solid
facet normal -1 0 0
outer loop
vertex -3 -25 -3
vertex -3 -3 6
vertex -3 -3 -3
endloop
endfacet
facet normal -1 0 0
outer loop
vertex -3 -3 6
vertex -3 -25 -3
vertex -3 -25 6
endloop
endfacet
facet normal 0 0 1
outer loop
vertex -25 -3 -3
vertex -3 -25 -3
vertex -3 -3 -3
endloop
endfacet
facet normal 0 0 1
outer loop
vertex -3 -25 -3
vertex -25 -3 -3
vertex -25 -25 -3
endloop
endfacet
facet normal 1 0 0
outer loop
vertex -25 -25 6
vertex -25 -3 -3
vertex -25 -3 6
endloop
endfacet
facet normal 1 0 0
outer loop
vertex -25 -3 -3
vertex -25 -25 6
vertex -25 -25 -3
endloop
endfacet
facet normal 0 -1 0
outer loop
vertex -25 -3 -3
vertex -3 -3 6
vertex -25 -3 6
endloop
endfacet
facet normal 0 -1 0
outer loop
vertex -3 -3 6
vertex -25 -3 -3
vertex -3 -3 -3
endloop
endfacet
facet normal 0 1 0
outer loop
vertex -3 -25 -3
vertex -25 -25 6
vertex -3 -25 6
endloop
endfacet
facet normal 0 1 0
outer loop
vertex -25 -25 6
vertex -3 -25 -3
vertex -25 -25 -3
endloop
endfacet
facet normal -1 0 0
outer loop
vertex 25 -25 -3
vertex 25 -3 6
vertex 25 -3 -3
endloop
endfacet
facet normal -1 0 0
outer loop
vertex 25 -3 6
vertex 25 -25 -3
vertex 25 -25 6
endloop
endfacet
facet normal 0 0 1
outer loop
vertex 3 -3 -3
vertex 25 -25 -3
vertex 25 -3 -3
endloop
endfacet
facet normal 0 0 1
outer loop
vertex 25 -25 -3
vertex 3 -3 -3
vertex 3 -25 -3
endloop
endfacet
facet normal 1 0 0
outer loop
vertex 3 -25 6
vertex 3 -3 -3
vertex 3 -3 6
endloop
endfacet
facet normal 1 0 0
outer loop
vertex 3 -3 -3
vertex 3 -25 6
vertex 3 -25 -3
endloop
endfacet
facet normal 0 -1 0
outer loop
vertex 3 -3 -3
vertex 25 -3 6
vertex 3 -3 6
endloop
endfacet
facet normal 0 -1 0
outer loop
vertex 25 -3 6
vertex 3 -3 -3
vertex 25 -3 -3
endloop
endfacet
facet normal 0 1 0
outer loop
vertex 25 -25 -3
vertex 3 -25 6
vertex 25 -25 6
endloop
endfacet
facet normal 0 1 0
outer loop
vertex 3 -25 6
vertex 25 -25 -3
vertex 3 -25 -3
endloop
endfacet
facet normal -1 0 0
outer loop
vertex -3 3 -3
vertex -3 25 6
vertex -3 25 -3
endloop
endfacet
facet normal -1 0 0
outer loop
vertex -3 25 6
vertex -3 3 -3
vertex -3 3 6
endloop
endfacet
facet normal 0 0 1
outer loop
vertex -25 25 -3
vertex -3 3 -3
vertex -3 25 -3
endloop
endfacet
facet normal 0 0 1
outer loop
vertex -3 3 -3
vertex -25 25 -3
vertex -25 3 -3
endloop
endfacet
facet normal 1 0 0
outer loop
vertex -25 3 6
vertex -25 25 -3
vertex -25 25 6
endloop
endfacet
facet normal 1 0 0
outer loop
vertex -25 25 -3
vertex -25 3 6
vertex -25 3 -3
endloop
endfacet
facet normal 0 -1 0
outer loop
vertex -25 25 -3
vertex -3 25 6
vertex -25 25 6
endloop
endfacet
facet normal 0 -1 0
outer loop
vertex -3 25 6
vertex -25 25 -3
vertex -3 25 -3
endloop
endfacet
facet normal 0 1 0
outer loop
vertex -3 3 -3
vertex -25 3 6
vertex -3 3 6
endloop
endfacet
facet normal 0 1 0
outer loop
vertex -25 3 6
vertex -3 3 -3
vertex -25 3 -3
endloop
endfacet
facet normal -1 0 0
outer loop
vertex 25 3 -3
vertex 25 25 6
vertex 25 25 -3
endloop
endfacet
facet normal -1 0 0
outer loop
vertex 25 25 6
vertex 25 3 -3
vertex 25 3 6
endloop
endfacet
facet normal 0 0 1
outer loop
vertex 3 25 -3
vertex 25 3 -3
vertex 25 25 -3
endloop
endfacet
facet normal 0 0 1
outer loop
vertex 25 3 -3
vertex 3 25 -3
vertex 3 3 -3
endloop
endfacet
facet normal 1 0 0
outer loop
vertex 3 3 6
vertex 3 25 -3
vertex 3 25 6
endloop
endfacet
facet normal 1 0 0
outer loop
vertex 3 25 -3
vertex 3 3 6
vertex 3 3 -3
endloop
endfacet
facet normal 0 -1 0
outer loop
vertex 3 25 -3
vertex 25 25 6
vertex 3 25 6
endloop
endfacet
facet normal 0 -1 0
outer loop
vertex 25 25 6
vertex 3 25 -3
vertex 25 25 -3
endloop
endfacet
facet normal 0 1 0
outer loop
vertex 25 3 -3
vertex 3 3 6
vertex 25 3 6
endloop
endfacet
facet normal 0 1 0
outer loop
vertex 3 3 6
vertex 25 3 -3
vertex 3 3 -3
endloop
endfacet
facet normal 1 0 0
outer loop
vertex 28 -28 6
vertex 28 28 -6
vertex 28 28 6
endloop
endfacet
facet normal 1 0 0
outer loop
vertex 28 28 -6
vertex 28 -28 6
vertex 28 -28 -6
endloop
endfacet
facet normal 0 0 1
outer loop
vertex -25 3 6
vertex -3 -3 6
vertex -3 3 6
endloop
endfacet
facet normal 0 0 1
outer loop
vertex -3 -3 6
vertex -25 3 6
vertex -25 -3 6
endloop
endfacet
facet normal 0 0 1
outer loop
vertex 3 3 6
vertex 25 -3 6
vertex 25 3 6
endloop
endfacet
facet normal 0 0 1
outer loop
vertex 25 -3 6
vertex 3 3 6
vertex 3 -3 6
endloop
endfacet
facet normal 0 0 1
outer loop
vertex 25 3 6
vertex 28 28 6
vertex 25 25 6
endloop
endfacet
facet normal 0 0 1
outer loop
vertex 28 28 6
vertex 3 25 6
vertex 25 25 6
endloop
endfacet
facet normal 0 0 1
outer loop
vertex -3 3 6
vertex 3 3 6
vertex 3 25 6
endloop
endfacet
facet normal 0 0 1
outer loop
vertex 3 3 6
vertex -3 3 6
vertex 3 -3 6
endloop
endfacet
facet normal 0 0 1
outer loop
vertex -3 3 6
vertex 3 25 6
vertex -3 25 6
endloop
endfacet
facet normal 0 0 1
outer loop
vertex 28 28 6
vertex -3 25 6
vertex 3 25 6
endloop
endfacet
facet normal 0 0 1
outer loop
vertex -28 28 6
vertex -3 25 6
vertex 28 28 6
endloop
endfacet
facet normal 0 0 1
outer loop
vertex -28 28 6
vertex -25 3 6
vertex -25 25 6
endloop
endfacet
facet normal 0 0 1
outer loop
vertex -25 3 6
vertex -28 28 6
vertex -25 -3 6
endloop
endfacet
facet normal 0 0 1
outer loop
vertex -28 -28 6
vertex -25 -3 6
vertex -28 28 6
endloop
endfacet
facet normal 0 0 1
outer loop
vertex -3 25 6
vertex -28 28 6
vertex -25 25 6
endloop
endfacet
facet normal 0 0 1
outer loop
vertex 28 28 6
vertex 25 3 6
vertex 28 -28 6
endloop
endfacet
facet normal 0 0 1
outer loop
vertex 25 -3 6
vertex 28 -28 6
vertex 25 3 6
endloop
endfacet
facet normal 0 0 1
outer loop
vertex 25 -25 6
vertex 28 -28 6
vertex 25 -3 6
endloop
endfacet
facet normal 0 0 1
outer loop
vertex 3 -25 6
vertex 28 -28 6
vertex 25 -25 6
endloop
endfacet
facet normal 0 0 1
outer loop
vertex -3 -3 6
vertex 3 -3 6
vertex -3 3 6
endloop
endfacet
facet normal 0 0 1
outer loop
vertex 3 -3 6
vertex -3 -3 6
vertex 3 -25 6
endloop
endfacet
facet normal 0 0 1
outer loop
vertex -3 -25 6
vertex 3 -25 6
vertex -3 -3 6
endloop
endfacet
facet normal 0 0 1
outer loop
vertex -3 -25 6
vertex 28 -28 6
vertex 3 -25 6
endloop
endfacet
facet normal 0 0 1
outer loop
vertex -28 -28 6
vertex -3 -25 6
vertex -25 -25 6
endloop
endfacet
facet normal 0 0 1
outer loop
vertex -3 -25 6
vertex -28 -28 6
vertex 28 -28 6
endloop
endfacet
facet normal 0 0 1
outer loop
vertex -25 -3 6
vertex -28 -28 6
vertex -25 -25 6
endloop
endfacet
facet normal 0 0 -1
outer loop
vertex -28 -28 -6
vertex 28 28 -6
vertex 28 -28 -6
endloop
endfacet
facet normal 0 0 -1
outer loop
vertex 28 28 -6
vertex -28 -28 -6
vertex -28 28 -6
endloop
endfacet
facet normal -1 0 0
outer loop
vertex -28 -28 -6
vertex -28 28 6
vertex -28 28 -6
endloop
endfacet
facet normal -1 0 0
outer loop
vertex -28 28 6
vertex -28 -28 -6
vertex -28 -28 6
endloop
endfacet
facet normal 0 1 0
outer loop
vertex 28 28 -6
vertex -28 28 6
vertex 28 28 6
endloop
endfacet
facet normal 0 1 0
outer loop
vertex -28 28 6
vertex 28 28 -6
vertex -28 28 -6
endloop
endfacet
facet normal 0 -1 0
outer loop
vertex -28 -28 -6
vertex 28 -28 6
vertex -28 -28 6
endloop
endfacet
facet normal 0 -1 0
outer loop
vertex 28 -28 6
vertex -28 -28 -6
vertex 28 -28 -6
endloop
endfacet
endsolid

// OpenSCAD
$fn = 32;

// ----------------------------------------------------------------------
// Pocket plate 56 x 56 x 12
// 2 x 2 pockets 22 mm square, 9 mm deep
// ----------------------------------------------------------------------

// --- parameters (mm) ---
thickness = 12;  // plate thickness
floor_t = 3;     // material left under each pocket
pocket = 22;     // pocket side length
pitch_x = 28;    // pocket pitch along X
pitch_y = 28;    // pocket pitch along Y
cols = 2;        // pockets per row
rows = 2;        // rows of pockets

// --- derived feature positions (mm) ---
depth = thickness - floor_t;        // = 9   pocket depth, down to the floor
span_x = (cols - 1) * pitch_x;      // = 28   distance between outer pockets
span_y = (rows - 1) * pitch_y;      // = 28   distance between outer pocket rows
origin_x = -span_x / 2;             // = -14   X of the first pocket
origin_y = -span_y / 2;             // = -14   Y of the first pocket
plate = [span_x + pocket + 6, span_y + pocket + 6, thickness];  // = [56, 56, 12]   overall size: pockets plus 3 mm of wall on each side
feature_centers = [
  [origin_x + 0 * pitch_x, origin_y + 0 * pitch_y],
  [origin_x + 1 * pitch_x, origin_y + 0 * pitch_y],
  [origin_x + 0 * pitch_x, origin_y + 1 * pitch_y],
  [origin_x + 1 * pitch_x, origin_y + 1 * pitch_y]
];   // pocket centres, used verbatim by the cutter loop

// plate outline, then one pocket per centre in feature_centers
difference() {
  cube(plate, center = true);
  for (centre = feature_centers)
    translate([centre[0] - pocket / 2, centre[1] - pocket / 2, plate[2] / 2 - depth])
      cube([pocket, pocket, depth + 1]);  // centred on the declared pocket centre
}
